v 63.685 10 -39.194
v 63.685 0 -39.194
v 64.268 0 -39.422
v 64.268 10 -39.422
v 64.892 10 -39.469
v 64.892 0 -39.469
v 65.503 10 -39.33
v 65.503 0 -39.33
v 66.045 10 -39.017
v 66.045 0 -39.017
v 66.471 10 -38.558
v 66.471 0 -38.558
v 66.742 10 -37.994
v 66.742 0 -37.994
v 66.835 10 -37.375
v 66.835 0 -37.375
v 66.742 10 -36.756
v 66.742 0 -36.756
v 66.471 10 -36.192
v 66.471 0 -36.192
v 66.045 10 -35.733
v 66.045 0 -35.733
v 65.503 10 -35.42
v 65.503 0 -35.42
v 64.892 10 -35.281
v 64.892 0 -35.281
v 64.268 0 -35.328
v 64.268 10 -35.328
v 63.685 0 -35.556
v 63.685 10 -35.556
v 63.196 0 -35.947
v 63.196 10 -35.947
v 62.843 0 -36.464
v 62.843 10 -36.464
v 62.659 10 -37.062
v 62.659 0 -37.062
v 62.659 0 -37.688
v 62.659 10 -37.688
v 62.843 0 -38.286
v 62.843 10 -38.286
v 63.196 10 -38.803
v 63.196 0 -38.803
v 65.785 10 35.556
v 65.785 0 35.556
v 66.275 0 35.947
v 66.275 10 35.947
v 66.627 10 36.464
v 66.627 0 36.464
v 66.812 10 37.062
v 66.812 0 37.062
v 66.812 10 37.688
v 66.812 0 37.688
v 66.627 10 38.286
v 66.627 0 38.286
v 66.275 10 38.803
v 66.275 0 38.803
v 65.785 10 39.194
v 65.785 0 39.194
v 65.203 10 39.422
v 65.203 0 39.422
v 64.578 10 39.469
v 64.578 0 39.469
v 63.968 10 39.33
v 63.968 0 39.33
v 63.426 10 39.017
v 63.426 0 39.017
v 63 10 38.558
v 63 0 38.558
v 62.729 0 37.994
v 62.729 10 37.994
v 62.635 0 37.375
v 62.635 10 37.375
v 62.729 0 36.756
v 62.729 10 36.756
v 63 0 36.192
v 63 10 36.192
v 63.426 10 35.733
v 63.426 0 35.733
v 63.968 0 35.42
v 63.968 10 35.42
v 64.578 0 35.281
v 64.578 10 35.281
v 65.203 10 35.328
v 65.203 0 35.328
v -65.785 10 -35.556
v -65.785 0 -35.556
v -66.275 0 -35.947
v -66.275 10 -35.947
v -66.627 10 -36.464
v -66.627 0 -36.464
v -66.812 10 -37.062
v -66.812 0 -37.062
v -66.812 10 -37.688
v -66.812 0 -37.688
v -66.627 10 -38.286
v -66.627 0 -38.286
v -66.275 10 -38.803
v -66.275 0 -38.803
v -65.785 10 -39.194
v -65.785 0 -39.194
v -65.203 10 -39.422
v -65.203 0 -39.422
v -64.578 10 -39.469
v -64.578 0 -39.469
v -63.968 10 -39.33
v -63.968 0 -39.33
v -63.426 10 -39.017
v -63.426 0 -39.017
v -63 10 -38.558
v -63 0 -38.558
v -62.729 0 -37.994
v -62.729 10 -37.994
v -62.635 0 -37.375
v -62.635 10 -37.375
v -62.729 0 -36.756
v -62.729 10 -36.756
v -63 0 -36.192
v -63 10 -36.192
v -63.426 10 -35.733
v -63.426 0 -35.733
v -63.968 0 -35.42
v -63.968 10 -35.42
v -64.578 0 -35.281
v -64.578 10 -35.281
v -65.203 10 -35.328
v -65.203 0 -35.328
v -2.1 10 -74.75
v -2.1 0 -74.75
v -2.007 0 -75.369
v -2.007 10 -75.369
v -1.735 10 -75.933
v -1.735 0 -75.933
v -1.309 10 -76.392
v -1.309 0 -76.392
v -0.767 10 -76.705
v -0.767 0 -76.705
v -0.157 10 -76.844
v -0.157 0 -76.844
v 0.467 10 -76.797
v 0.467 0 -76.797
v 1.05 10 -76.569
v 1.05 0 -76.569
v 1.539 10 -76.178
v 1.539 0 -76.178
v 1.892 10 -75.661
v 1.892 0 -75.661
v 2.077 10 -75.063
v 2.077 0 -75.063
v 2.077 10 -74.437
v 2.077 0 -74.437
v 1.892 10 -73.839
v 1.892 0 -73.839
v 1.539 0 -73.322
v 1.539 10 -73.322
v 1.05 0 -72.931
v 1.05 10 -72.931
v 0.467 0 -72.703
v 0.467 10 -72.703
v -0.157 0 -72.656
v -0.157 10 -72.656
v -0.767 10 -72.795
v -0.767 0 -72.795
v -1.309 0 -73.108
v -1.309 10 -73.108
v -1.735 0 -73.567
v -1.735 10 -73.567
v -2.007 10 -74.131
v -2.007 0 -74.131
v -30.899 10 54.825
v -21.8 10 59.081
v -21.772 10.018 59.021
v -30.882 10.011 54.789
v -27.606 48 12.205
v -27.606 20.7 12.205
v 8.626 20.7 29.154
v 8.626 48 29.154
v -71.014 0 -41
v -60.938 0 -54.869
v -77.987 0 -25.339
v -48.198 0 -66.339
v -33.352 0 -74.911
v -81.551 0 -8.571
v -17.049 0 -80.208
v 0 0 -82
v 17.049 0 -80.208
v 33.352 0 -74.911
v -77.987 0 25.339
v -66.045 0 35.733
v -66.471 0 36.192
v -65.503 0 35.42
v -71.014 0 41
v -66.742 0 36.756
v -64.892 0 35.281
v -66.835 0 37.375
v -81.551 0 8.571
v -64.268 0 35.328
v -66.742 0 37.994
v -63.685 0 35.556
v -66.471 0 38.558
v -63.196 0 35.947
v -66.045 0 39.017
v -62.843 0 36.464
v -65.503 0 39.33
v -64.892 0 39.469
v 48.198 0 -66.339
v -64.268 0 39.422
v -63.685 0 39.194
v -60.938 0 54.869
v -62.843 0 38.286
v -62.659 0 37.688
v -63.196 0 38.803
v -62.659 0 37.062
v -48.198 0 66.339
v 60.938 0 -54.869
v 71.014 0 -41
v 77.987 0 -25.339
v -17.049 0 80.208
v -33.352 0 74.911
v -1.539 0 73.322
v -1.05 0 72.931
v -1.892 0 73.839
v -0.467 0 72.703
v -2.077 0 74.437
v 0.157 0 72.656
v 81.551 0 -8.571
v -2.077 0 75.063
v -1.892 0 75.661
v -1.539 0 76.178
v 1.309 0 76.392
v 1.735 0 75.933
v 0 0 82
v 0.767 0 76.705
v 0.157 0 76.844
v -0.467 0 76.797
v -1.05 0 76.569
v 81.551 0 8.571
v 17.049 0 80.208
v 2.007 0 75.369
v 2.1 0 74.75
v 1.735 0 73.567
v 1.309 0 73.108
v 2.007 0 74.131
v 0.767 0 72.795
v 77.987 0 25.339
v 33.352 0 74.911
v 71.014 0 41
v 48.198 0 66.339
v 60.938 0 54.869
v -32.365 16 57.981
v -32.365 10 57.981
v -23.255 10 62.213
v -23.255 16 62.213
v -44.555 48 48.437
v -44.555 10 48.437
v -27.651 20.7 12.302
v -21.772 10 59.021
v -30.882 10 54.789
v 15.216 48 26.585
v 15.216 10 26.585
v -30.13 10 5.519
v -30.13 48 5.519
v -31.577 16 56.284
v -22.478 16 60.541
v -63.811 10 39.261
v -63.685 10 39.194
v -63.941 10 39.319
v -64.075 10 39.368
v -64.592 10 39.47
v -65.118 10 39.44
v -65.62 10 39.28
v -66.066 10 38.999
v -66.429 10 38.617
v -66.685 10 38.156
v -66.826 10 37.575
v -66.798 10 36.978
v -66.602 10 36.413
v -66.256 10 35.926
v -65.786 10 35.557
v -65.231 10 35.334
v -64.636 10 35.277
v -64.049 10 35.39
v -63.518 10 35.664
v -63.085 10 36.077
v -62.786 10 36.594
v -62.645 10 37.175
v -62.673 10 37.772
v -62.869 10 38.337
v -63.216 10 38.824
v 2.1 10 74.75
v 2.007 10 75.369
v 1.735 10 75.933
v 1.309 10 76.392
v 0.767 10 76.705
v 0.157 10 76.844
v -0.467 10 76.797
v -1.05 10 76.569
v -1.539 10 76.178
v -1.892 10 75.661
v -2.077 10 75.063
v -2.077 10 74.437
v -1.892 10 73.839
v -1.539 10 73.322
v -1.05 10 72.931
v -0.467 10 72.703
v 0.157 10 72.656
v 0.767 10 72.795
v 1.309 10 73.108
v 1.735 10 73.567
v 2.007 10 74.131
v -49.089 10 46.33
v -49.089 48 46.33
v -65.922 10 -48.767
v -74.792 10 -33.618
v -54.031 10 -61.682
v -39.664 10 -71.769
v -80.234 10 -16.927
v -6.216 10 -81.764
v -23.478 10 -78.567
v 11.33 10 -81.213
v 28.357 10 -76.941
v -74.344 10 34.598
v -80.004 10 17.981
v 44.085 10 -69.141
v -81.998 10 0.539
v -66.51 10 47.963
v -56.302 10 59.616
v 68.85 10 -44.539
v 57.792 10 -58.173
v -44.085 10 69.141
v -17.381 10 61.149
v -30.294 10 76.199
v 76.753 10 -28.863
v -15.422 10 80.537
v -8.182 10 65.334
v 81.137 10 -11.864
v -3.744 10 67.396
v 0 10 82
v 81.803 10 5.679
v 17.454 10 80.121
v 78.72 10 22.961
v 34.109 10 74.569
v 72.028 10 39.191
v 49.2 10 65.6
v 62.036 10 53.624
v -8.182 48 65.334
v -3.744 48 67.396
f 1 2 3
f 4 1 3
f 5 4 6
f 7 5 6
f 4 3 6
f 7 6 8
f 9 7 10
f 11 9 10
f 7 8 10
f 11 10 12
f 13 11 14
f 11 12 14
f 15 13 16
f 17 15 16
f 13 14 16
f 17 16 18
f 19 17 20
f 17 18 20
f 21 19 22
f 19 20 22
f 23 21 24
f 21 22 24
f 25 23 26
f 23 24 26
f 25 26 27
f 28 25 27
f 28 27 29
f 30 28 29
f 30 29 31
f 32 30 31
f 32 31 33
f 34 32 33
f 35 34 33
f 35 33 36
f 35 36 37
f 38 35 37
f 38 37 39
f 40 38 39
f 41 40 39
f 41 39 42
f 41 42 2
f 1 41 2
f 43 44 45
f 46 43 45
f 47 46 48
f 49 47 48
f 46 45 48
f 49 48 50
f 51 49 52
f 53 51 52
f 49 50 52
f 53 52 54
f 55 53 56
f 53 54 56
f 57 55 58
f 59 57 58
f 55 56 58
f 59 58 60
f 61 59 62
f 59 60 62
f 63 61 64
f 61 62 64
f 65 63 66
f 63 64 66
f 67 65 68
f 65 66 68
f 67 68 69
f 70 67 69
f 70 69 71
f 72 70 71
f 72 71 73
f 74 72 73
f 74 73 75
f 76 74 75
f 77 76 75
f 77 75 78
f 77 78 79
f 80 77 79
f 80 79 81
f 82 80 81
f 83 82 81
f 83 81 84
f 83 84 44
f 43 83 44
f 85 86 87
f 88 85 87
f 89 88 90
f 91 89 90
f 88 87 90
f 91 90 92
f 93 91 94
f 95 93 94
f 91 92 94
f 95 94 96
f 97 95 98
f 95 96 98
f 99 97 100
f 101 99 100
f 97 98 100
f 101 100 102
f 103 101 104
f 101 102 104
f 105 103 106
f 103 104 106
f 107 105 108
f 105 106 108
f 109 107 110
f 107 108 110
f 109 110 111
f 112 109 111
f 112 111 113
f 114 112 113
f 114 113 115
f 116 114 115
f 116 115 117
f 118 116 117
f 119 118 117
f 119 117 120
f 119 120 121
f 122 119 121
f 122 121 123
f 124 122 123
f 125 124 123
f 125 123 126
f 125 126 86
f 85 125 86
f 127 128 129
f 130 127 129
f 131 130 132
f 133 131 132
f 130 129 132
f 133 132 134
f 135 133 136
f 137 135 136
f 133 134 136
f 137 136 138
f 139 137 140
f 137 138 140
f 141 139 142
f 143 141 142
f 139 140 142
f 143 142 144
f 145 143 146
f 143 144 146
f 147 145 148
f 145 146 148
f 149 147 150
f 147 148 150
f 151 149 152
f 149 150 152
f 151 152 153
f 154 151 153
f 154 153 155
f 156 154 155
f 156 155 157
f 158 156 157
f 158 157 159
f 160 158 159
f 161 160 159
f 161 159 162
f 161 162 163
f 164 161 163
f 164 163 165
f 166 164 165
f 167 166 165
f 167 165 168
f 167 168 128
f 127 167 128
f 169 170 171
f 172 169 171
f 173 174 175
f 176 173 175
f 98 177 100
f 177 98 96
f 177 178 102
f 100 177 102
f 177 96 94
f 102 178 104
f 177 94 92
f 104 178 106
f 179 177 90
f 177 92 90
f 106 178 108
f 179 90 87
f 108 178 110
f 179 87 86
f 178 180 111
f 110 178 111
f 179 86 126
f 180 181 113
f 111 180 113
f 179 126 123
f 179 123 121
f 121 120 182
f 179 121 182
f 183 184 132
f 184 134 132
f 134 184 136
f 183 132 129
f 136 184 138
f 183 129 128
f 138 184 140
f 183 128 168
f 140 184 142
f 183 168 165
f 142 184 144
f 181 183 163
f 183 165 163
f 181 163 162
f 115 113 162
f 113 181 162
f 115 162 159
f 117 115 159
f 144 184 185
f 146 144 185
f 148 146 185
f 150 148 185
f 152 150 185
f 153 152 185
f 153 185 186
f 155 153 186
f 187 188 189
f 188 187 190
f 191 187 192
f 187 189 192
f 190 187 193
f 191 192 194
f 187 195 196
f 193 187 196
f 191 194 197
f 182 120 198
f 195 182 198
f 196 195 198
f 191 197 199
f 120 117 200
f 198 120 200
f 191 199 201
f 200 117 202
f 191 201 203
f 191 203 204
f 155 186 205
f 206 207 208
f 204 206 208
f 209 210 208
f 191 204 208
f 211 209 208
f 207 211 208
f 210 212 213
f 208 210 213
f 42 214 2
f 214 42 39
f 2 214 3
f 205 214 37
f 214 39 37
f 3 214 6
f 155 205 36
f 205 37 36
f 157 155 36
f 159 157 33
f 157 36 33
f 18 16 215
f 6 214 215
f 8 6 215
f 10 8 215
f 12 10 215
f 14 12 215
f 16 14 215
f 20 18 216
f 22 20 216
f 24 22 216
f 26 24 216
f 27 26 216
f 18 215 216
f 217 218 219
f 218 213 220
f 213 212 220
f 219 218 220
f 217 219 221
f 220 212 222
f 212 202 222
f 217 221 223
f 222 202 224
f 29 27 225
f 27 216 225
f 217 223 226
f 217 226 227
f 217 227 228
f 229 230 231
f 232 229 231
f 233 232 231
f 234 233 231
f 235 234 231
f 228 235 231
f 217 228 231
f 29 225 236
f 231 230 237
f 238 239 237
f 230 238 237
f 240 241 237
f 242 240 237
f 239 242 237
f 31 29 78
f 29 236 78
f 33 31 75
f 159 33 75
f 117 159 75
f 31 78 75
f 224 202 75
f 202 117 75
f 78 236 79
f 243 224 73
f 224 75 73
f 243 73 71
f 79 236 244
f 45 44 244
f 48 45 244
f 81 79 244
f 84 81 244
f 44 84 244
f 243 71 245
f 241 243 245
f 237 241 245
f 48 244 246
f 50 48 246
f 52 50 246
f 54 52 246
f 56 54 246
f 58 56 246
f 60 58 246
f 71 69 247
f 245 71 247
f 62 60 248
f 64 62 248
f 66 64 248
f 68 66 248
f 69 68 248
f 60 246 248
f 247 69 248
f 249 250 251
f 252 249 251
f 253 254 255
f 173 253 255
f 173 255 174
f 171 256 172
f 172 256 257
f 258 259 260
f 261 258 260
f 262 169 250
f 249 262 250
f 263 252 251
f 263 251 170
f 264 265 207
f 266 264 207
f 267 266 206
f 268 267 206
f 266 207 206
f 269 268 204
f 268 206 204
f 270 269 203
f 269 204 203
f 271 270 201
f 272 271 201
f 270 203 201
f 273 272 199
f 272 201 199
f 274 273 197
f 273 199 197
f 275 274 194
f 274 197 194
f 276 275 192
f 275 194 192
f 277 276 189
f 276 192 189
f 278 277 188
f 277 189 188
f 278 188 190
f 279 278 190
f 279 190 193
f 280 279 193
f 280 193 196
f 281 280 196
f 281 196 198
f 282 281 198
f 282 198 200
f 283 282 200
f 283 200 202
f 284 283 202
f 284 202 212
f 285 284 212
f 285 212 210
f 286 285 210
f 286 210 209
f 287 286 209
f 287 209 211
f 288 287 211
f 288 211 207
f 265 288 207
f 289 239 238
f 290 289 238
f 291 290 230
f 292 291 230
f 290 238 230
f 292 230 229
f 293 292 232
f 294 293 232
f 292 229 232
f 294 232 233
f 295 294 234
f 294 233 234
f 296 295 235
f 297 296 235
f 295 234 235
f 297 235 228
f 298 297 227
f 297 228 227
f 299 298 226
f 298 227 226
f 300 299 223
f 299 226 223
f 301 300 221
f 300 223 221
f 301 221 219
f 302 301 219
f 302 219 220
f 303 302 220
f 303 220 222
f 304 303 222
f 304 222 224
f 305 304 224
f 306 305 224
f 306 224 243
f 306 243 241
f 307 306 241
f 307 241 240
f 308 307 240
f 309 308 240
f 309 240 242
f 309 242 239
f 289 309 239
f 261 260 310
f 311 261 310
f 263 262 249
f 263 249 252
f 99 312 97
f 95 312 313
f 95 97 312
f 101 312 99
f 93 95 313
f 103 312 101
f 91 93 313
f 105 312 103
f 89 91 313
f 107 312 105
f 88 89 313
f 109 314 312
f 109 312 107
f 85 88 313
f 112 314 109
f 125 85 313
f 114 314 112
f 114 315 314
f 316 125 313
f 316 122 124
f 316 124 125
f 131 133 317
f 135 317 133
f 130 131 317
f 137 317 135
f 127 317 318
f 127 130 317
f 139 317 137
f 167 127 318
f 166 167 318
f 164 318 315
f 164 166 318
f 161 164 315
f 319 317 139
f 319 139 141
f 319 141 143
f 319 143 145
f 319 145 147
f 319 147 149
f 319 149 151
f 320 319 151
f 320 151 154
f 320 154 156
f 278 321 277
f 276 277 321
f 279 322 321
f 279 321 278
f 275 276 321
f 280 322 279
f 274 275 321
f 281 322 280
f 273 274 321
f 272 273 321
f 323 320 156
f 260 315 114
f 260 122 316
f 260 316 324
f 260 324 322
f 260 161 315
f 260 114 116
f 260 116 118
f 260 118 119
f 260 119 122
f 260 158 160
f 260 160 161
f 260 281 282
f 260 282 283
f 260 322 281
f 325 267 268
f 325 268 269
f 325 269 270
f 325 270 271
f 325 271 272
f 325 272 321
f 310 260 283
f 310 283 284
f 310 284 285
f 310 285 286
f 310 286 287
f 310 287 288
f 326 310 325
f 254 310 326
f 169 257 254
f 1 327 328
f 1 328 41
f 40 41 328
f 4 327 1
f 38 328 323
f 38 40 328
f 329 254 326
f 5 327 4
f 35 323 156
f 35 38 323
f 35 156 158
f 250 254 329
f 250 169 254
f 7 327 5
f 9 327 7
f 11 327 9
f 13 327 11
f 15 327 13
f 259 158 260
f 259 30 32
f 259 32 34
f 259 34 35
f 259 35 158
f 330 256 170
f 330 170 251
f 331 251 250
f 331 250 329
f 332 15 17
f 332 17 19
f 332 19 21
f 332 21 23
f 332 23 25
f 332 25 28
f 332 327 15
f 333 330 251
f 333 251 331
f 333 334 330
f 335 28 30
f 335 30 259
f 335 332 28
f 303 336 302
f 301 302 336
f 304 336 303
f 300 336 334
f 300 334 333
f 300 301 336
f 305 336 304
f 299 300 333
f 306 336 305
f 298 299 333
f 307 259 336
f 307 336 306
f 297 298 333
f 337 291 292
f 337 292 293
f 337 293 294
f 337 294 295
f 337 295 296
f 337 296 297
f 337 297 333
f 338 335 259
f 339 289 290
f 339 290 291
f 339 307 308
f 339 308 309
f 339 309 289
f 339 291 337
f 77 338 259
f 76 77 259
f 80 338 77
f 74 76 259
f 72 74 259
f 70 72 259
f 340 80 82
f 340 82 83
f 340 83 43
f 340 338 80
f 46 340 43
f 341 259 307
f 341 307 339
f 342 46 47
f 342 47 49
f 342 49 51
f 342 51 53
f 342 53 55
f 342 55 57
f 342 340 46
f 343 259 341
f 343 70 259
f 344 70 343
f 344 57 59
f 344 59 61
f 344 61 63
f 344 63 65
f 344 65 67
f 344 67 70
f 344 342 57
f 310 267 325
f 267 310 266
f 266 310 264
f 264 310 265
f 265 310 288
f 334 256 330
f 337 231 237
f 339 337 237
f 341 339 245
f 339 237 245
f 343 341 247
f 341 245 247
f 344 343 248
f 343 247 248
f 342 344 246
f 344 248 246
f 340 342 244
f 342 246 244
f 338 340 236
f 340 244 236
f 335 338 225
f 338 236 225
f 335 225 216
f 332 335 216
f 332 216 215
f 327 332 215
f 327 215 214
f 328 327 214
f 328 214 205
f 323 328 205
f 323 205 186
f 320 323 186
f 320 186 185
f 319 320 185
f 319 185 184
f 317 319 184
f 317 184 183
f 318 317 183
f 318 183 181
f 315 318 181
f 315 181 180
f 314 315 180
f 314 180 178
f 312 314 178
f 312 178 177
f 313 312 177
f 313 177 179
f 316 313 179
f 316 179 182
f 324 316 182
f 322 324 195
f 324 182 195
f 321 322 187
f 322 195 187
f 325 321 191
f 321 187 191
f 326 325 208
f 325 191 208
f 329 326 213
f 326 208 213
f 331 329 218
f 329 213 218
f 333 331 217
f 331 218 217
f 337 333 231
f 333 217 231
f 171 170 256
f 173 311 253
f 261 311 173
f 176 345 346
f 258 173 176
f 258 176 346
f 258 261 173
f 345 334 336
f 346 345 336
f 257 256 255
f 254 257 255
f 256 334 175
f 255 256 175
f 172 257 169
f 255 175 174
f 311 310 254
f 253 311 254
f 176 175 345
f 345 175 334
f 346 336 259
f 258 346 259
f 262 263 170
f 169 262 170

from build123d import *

# Parameters (mm, degrees)
SKETCH1_R                          = 82
BOSS_EXTRUDE5_DEPTH                = 10
TAPPED_HOLE_FOR_M4X0_7_HELICOIL4_D = 4.2
CIRPATTERN5_COUNT                  = 6
BOSS_EXTRUDE7_DEPTH                = 10.7
CUT_EXTRUDE1_DEPTH                 = 137.603415174
BOSS_EXTRUDE8_DEPTH                = 38
BOSS_EXTRUDE9_DEPTH                = 6
CUT_EXTRUDE2_DEPTH                 = 30


with BuildPart() as part:
    # Sketch1 → Boss-Extrude5 (new body)
    with BuildSketch(Plane(origin=(0, 0, 0), x_dir=(1, 0, 0), z_dir=(0, 1, 0))):
        with Locations(Location((0, 0, 0), (0, 0, 270))):
            Circle(SKETCH1_R)
    extrude(amount=BOSS_EXTRUDE5_DEPTH)

    # Tapped Hole for M4x0.7 Helicoil4 (through all)
    with Locations(Plane(origin=(0, 10, 0), x_dir=(1, 0, 0), z_dir=(0, 1, 0))):
        with Locations((0, 74.75)):
            tapped_hole_for_m4x0_7_helicoil4 = Hole(TAPPED_HOLE_FOR_M4X0_7_HELICOIL4_D / 2)

    # CirPattern5: Tapped Hole for M4x0.7 Helicoil4 ×6 about axis
    cirpattern5_axis = Axis((0, 0, 0), (0, 1, 0))
    for i in range(1, CIRPATTERN5_COUNT):
        add(tapped_hole_for_m4x0_7_helicoil4.rotate(cirpattern5_axis, i * 360 / CIRPATTERN5_COUNT), mode=Mode.SUBTRACT)

    # Sketch27 → Boss-Extrude7 (add)
    with BuildSketch(Plane(origin=(0, 10, 0), x_dir=(1, 0, 0), z_dir=(0, 1, 0))):
        Polygon((-44.554655662, -48.436893572), (-27.605576649, -12.205295199), (8.626021723, -29.154374211), (-8.181727906, -65.334302871), align=None)
    extrude(amount=BOSS_EXTRUDE7_DEPTH)

    # Sketch28 → Cut-Extrude1 (cut, through all)
    with BuildSketch(Plane(origin=(18.234649477, 0, 8.471089754), x_dir=(0.4213159772609458, 0, -0.9069139139436854), z_dir=(0.9069139139436853, 0, 0.4213159772609457))):
        Polygon((-62.69968102, 10), (-22.806226852, 20.7), (-62.69968102, 20.7), align=None)
    extrude(amount=-CUT_EXTRUDE1_DEPTH, mode=Mode.SUBTRACT)

    # Sketch14 → Boss-Extrude8 (add)
    with BuildSketch(Plane(origin=(0, 10, 0), x_dir=(1, 0, 0), z_dir=(0, 1, 0))):
        Polygon((-30.130006255, -5.519187558), (-49.089225231, -46.330313685), (-44.554655662, -48.436893572), (-27.605576649, -12.205295199), (8.626021723, -29.154374211), (-8.181727906, -65.334302871), (-3.743529534, -67.396112548), (15.215689442, -26.584986421), align=None)
    extrude(amount=BOSS_EXTRUDE8_DEPTH)

    # Sketch29 → Boss-Extrude9 (add)
    with BuildSketch(Plane(origin=(0, 10, 0), x_dir=(1, 0, 0), z_dir=(0, 1, 0))):
        Polygon((-32.365238615, -57.981021357), (-23.255343874, -62.213114555), (-21.772266919, -59.020681327), (-30.882161661, -54.788588129), align=None)
    extrude(amount=BOSS_EXTRUDE9_DEPTH)

    # Sketch31 → Cut-Extrude2 (cut)
    with BuildSketch(Plane(origin=(-17.964660281, 0, -8.403836988), x_dir=(0.42372697531108894, 0, -0.9057899593138112), z_dir=(0.9057899593138112, 0, 0.42372697531108894))):
        Polygon((-64.82666926, 17.73267596), (-62.752661337, 10), (-62.329980493, 10.1133687), (-62.276430508, 18.416684368), align=None)
    extrude(amount=CUT_EXTRUDE2_DEPTH, mode=Mode.SUBTRACT)


solid = part.part
